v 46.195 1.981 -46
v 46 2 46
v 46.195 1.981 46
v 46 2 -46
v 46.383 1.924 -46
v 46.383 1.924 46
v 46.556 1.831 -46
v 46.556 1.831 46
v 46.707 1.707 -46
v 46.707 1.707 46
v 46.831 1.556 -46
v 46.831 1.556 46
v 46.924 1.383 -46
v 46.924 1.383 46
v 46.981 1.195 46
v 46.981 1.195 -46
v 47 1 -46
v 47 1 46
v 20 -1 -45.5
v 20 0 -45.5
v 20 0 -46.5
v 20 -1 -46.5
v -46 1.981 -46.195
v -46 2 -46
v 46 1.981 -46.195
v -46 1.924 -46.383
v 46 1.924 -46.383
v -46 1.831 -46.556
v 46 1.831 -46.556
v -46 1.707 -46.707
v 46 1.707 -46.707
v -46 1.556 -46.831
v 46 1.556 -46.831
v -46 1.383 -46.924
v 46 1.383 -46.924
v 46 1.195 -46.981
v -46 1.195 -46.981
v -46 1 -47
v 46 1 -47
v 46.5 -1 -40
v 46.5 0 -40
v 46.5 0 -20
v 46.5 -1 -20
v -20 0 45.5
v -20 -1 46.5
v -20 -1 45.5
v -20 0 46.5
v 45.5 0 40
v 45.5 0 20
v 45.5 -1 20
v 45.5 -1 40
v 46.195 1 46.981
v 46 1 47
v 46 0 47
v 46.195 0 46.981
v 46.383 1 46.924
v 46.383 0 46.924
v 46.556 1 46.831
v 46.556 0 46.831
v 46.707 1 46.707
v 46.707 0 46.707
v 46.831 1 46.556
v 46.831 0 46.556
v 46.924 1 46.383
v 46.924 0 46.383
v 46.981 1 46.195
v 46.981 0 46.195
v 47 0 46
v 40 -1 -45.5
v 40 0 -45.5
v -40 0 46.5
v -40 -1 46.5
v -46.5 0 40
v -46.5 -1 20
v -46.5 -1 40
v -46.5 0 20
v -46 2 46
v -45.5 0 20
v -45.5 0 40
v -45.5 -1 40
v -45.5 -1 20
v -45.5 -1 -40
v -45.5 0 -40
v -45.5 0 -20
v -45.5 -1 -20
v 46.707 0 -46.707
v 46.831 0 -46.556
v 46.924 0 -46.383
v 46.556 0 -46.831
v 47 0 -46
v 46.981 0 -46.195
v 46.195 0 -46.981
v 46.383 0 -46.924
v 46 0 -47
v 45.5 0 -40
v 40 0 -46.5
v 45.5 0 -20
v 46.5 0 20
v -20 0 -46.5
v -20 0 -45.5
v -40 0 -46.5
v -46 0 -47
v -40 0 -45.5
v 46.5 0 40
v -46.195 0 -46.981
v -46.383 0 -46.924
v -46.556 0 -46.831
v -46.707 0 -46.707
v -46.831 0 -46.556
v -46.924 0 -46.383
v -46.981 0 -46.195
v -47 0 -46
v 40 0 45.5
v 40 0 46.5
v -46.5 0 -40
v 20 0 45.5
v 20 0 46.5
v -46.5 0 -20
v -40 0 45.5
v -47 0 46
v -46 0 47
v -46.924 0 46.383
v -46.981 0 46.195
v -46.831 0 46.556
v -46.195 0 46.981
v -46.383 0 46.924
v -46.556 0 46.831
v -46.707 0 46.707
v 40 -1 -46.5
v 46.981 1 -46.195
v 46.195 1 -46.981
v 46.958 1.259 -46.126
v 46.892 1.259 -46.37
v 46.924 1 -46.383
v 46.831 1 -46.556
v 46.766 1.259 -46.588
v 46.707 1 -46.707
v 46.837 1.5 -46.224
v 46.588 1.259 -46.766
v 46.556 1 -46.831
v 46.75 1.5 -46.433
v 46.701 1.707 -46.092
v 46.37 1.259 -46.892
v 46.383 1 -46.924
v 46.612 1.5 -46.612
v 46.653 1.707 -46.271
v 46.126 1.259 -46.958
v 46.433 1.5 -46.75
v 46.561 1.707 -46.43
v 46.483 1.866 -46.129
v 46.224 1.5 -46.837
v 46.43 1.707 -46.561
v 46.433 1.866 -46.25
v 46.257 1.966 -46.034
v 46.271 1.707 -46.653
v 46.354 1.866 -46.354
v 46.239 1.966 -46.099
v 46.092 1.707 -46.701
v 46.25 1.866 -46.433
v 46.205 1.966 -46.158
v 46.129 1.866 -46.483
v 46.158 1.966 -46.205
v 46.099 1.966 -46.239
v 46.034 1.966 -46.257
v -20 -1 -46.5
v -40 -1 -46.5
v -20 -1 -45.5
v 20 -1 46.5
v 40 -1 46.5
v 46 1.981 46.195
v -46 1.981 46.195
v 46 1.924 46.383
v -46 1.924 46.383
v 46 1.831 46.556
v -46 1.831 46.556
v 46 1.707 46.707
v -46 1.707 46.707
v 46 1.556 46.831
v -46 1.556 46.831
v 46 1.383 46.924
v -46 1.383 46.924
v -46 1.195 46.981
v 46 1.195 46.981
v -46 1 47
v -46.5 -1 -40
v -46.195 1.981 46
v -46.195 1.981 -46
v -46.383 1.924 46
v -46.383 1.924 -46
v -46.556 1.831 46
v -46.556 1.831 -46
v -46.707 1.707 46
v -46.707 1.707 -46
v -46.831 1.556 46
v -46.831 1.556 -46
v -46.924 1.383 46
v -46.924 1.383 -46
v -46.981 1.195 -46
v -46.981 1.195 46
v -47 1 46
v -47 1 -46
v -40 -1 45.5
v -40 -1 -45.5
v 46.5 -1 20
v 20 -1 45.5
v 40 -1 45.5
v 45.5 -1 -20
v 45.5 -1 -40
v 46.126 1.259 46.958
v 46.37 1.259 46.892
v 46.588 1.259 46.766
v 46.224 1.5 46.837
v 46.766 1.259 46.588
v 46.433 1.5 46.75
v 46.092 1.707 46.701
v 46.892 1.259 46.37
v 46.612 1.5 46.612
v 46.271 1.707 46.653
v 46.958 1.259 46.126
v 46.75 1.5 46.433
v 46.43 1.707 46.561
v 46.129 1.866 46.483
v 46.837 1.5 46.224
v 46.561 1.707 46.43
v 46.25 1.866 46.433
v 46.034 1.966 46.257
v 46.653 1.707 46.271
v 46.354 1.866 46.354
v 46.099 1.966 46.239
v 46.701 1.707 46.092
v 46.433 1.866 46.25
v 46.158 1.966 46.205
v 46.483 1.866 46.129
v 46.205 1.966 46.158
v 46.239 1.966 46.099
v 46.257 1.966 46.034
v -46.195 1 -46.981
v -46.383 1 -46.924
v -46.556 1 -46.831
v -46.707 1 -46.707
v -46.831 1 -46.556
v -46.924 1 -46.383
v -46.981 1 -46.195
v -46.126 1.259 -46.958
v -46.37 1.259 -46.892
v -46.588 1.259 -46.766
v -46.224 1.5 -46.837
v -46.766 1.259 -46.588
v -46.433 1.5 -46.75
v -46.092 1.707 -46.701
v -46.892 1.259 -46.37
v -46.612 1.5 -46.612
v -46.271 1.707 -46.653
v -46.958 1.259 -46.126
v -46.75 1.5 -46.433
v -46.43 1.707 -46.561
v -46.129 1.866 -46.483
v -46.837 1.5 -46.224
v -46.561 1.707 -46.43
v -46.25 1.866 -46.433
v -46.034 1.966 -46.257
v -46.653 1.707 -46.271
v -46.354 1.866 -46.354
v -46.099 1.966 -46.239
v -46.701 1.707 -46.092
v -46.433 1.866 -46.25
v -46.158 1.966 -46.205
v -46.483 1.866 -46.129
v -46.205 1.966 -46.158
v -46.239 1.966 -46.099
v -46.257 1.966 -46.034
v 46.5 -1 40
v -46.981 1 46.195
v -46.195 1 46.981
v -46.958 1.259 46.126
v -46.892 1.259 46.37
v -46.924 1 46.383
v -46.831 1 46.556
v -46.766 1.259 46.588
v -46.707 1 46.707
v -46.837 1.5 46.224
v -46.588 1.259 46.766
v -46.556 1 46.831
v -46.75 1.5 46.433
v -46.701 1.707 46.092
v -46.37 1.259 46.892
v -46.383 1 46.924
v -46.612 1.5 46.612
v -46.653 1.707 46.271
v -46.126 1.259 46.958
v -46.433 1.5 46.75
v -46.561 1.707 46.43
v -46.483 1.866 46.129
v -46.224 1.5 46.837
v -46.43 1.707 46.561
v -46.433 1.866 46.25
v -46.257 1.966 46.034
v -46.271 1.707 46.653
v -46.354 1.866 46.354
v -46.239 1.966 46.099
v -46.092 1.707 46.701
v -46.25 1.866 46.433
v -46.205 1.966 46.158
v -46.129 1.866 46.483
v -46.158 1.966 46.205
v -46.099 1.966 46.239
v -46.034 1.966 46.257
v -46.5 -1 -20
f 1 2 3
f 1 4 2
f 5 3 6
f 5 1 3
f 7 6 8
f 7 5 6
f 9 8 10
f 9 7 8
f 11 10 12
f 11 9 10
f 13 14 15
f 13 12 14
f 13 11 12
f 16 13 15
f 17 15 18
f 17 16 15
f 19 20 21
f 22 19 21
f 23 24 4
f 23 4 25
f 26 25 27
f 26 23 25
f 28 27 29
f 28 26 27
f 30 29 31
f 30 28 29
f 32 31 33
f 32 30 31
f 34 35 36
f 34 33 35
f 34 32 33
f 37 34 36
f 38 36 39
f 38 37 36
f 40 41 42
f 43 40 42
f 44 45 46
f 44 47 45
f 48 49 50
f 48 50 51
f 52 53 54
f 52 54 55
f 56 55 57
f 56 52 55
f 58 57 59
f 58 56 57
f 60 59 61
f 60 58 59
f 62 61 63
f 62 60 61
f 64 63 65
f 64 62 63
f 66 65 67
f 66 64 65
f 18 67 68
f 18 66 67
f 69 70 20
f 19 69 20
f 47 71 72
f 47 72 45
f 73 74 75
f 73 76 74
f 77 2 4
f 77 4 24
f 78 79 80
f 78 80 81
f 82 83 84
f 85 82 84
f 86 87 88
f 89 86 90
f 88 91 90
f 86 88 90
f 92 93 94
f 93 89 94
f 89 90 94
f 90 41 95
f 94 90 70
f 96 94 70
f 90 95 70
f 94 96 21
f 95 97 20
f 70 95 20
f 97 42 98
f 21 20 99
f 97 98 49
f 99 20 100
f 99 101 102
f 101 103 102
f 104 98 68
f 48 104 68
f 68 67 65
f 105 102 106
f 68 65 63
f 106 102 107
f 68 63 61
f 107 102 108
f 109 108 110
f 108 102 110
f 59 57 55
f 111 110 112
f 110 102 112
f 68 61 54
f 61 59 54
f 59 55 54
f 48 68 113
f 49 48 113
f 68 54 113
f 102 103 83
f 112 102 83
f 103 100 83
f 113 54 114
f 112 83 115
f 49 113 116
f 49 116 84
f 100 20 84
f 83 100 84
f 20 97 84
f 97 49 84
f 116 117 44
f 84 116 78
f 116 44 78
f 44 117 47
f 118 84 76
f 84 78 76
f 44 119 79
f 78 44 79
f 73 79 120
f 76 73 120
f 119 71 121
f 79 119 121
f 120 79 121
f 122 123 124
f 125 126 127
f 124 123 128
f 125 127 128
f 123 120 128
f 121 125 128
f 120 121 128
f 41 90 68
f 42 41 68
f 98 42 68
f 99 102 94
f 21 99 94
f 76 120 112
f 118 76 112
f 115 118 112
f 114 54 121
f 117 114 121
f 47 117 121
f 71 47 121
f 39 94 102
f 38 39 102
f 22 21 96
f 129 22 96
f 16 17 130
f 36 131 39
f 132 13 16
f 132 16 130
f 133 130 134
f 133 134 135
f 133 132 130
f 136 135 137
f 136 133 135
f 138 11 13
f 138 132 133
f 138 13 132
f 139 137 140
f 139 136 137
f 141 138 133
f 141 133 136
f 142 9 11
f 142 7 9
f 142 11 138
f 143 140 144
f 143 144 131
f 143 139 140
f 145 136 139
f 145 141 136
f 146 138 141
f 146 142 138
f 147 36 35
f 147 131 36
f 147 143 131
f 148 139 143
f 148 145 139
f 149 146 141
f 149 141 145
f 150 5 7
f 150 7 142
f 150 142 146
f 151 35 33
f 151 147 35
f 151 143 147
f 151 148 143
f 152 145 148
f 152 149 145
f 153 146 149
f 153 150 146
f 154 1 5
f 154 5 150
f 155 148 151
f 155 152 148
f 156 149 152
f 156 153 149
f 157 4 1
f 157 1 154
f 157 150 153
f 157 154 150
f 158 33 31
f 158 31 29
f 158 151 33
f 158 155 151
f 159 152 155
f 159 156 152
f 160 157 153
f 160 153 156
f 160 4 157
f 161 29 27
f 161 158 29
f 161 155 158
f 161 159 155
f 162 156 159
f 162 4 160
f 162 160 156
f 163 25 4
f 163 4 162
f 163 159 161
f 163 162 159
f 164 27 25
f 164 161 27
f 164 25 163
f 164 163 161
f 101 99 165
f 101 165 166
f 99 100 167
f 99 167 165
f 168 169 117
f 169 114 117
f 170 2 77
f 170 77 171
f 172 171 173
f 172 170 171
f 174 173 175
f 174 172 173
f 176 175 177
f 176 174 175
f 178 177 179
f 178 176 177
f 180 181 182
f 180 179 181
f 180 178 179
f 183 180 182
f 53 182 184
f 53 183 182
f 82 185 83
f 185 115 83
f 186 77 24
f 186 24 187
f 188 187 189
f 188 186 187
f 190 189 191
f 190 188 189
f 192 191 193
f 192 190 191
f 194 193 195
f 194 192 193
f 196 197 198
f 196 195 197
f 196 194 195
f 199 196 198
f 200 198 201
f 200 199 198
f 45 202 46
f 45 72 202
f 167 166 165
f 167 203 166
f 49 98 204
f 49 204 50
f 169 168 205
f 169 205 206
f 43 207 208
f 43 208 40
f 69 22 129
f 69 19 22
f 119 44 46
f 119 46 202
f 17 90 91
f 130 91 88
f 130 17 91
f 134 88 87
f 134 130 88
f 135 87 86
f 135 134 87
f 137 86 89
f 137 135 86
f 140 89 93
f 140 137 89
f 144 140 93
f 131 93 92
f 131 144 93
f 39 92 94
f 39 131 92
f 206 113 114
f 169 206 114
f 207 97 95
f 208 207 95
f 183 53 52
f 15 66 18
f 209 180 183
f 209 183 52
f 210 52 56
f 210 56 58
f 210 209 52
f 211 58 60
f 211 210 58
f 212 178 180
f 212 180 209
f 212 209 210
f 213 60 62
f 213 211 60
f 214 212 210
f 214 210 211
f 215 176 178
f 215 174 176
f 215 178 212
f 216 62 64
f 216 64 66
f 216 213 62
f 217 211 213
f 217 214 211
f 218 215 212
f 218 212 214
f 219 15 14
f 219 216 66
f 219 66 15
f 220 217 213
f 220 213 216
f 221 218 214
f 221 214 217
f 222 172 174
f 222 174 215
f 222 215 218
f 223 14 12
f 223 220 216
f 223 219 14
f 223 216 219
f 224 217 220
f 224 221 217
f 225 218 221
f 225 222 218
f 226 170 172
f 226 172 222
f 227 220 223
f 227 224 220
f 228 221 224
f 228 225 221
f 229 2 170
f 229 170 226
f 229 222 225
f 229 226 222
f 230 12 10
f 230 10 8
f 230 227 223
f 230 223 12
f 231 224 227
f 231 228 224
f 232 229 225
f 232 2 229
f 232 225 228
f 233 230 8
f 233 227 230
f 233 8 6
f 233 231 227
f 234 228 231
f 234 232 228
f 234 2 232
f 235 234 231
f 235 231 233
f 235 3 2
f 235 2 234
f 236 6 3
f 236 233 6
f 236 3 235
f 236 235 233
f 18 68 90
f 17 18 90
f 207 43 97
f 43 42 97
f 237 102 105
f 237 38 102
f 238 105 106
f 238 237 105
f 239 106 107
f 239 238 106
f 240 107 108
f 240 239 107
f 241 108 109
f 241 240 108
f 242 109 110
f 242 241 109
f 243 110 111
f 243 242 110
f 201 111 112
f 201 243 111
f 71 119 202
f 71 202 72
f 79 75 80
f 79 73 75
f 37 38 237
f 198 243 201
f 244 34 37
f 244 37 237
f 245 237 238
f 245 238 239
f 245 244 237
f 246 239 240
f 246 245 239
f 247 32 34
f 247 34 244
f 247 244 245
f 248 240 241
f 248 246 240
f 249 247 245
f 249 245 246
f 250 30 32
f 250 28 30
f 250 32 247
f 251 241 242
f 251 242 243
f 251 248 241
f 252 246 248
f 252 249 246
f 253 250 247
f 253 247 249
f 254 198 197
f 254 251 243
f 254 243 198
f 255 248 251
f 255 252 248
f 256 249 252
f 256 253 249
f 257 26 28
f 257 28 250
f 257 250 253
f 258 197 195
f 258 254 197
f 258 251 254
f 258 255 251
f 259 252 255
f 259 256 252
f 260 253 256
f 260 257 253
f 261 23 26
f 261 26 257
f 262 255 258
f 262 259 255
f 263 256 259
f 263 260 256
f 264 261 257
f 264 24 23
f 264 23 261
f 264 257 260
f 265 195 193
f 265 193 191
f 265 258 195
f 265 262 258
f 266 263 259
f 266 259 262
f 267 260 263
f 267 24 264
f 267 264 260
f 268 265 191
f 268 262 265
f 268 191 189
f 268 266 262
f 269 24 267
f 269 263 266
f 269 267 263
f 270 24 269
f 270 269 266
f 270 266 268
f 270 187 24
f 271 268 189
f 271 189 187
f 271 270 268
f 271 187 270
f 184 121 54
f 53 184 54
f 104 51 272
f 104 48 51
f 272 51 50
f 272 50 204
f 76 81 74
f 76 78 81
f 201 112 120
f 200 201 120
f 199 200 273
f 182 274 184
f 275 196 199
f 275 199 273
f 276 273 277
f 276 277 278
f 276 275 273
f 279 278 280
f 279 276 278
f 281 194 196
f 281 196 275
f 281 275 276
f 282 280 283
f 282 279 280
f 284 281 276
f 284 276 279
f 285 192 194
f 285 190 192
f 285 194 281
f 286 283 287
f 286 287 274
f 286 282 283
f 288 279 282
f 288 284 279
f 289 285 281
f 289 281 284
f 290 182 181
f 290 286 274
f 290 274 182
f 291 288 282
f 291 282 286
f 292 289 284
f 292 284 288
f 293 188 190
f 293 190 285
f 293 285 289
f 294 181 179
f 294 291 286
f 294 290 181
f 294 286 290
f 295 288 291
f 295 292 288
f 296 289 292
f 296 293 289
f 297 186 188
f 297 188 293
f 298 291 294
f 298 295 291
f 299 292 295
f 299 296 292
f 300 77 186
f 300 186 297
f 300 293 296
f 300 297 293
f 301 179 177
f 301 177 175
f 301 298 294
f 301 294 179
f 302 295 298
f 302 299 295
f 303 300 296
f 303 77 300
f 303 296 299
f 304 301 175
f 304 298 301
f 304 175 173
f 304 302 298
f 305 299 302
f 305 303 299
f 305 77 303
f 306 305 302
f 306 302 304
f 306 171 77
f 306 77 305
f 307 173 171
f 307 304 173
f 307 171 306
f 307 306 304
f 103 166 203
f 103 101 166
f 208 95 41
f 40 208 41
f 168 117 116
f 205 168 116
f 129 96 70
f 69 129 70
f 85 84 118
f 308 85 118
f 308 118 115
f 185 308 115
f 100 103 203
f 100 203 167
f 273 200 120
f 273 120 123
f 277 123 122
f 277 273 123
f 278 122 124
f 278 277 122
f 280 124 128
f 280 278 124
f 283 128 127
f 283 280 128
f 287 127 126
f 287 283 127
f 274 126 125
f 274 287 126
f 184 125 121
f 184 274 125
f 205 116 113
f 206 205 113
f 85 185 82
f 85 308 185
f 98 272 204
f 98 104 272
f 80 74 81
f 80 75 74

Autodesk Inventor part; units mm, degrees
ref_plane "YZ Plane" through (0, 0, 0) normal (1, 0, 0) x (0, 1, 0)
ref_plane "XZ Plane" through (0, 0, 0) normal (0, 1, 0) x (-1, 0, 0)
ref_plane "XY Plane" through (0, 0, 0) normal (0, 0, 1) x (1, 0, 0)
sketch "Sketch4" plane through (0, 0, 0) normal (0, 1, 0) x (-1, 0, 0)
  line L0 (47, 47) -> (-47, 47)
  line L1 (-47, 47) -> (-47, -47)
  line L2 (-47, -47) -> (47, -47)
  line L3 (47, -47) -> (47, 47)
  line L4 (47, 47) -> (-47, -47) construction
  line L5 (-47, 47) -> (47, -47) construction
  point P0 (0, 0)
  dimension "d52" = 94
  dimension "d53" = 94
extrude "Extrusion5" add sketch "Sketch4" along normal blind 2
sketch "Sketch6" plane through (0, 0, 0) normal (0, -1, 0) x (1, 0, 0)
  line L0 (-46.5, -40) -> (-45.5, -40)
  line L1 (-45.5, -40) -> (-45.5, -20)
  line L2 (-45.5, -20) -> (-46.5, -20)
  line L3 (-46.5, -20) -> (-46.5, -40)
  line L4 (-45.5, 20) -> (-46.5, 20)
  line L5 (-46.5, 20) -> (-46.5, 40)
  line L6 (-46.5, 40) -> (-45.5, 40)
  line L7 (-45.5, 40) -> (-45.5, 20)
  line L8 (-40, 46.5) -> (-20, 46.5)
  line L9 (-20, 46.5) -> (-20, 45.5)
  line L10 (-20, 45.5) -> (-40, 45.5)
  line L11 (-40, 45.5) -> (-40, 46.5)
  line L12 (40, 46.5) -> (20, 46.5)
  line L13 (20, 46.5) -> (20, 45.5)
  line L14 (20, 45.5) -> (40, 45.5)
  line L15 (40, 45.5) -> (40, 46.5)
  line L16 (45.5, 40) -> (46.5, 40)
  line L17 (46.5, 40) -> (46.5, 20)
  line L18 (46.5, 20) -> (45.5, 20)
  line L19 (45.5, 20) -> (45.5, 40)
  line L20 (45.5, -40) -> (46.5, -40)
  line L21 (46.5, -40) -> (46.5, -20)
  line L22 (46.5, -20) -> (45.5, -20)
  line L23 (45.5, -20) -> (45.5, -40)
  line L24 (40, -45.5) -> (20, -45.5)
  line L25 (20, -45.5) -> (20, -46.5)
  line L26 (20, -46.5) -> (40, -46.5)
  line L27 (40, -46.5) -> (40, -45.5)
  line L28 (-40, -45.5) -> (-20, -45.5)
  line L29 (-20, -45.5) -> (-20, -46.5)
  line L30 (-20, -46.5) -> (-40, -46.5)
  line L31 (-40, -46.5) -> (-40, -45.5)
  line L32 (-47, 47) -> (-47, -47)
  line L33 (47, 47) -> (-47, 47)
  line L34 (47, -47) -> (47, 47)
  line L35 (-47, -47) -> (47, -47)
  point P0 (0, 0)
  point P1 (-46, 40)
  point P2 (-46, 20)
  point P3 (46, 40)
  point P4 (46, -40)
  point P5 (-40, -46)
  point P6 (-46, -40)
  dimension "d123" = 1
  dimension "d124" = 20
  dimension "d119" = 1
  dimension "d118" = 20
  dimension "d116" = 20
  dimension "d117" = 1
  dimension "d112" = 20
  dimension "d113" = 1
  dimension "d108" = 1
  dimension "d109" = 20
  dimension "d104" = 1
  dimension "d105" = 20
  dimension "d101" = 20
  dimension "d102" = 1
  dimension "d97" = 20
  dimension "d98" = 1
  dimension "d114" = 7
  dimension "d115" = 0.5
  dimension "d111" = 0.5
  dimension "d110" = 7
  dimension "d107" = 7
  dimension "d106" = 0.5
  dimension "d103" = 0.5
  dimension "d95" = 7
  dimension "d99" = 7
  dimension "d100" = 0.5
  dimension "d96" = 0.5
  dimension "d94" = 7
  dimension "d93" = 7
  dimension "d122" = 0.5
  dimension "d120" = 7
  dimension "d121" = 0.5
extrude "Extrusion7" add sketch "Sketch6" along normal blind 1 contours L3 L2 L1 L0 | L4 L5 L6 L7 | L8 L9 L10 L11 | L15 L14 L13 L12 | L16 L17 L18 L19 | L23 L22 L21 L20 | L27 L26 L25 L24 | L28 L29 L30 L31
fillet "Fillet9" radius 1 1 edges at (47, 1, -47)
fillet "Fillet10" radius 1 1 edges at (-47, 1, -47)
fillet "Fillet11" radius 1 1 edges at (-47, 1, 47)
fillet "Fillet12" radius 1 1 edges at (47, 1, 47)
fillet "Fillet13" radius 1 8 edges at (-46.7071, 2, -46.7071) (-47, 2, 0) (-46.7071, 2, 46.7071) (0, 2, 47) (46.7071, 2, 46.7071) (47, 2, 0) (46.7071, 2, -46.7071) (0, 2, -47)
properties part number "block_main" material "PC/ABS Plastic"
